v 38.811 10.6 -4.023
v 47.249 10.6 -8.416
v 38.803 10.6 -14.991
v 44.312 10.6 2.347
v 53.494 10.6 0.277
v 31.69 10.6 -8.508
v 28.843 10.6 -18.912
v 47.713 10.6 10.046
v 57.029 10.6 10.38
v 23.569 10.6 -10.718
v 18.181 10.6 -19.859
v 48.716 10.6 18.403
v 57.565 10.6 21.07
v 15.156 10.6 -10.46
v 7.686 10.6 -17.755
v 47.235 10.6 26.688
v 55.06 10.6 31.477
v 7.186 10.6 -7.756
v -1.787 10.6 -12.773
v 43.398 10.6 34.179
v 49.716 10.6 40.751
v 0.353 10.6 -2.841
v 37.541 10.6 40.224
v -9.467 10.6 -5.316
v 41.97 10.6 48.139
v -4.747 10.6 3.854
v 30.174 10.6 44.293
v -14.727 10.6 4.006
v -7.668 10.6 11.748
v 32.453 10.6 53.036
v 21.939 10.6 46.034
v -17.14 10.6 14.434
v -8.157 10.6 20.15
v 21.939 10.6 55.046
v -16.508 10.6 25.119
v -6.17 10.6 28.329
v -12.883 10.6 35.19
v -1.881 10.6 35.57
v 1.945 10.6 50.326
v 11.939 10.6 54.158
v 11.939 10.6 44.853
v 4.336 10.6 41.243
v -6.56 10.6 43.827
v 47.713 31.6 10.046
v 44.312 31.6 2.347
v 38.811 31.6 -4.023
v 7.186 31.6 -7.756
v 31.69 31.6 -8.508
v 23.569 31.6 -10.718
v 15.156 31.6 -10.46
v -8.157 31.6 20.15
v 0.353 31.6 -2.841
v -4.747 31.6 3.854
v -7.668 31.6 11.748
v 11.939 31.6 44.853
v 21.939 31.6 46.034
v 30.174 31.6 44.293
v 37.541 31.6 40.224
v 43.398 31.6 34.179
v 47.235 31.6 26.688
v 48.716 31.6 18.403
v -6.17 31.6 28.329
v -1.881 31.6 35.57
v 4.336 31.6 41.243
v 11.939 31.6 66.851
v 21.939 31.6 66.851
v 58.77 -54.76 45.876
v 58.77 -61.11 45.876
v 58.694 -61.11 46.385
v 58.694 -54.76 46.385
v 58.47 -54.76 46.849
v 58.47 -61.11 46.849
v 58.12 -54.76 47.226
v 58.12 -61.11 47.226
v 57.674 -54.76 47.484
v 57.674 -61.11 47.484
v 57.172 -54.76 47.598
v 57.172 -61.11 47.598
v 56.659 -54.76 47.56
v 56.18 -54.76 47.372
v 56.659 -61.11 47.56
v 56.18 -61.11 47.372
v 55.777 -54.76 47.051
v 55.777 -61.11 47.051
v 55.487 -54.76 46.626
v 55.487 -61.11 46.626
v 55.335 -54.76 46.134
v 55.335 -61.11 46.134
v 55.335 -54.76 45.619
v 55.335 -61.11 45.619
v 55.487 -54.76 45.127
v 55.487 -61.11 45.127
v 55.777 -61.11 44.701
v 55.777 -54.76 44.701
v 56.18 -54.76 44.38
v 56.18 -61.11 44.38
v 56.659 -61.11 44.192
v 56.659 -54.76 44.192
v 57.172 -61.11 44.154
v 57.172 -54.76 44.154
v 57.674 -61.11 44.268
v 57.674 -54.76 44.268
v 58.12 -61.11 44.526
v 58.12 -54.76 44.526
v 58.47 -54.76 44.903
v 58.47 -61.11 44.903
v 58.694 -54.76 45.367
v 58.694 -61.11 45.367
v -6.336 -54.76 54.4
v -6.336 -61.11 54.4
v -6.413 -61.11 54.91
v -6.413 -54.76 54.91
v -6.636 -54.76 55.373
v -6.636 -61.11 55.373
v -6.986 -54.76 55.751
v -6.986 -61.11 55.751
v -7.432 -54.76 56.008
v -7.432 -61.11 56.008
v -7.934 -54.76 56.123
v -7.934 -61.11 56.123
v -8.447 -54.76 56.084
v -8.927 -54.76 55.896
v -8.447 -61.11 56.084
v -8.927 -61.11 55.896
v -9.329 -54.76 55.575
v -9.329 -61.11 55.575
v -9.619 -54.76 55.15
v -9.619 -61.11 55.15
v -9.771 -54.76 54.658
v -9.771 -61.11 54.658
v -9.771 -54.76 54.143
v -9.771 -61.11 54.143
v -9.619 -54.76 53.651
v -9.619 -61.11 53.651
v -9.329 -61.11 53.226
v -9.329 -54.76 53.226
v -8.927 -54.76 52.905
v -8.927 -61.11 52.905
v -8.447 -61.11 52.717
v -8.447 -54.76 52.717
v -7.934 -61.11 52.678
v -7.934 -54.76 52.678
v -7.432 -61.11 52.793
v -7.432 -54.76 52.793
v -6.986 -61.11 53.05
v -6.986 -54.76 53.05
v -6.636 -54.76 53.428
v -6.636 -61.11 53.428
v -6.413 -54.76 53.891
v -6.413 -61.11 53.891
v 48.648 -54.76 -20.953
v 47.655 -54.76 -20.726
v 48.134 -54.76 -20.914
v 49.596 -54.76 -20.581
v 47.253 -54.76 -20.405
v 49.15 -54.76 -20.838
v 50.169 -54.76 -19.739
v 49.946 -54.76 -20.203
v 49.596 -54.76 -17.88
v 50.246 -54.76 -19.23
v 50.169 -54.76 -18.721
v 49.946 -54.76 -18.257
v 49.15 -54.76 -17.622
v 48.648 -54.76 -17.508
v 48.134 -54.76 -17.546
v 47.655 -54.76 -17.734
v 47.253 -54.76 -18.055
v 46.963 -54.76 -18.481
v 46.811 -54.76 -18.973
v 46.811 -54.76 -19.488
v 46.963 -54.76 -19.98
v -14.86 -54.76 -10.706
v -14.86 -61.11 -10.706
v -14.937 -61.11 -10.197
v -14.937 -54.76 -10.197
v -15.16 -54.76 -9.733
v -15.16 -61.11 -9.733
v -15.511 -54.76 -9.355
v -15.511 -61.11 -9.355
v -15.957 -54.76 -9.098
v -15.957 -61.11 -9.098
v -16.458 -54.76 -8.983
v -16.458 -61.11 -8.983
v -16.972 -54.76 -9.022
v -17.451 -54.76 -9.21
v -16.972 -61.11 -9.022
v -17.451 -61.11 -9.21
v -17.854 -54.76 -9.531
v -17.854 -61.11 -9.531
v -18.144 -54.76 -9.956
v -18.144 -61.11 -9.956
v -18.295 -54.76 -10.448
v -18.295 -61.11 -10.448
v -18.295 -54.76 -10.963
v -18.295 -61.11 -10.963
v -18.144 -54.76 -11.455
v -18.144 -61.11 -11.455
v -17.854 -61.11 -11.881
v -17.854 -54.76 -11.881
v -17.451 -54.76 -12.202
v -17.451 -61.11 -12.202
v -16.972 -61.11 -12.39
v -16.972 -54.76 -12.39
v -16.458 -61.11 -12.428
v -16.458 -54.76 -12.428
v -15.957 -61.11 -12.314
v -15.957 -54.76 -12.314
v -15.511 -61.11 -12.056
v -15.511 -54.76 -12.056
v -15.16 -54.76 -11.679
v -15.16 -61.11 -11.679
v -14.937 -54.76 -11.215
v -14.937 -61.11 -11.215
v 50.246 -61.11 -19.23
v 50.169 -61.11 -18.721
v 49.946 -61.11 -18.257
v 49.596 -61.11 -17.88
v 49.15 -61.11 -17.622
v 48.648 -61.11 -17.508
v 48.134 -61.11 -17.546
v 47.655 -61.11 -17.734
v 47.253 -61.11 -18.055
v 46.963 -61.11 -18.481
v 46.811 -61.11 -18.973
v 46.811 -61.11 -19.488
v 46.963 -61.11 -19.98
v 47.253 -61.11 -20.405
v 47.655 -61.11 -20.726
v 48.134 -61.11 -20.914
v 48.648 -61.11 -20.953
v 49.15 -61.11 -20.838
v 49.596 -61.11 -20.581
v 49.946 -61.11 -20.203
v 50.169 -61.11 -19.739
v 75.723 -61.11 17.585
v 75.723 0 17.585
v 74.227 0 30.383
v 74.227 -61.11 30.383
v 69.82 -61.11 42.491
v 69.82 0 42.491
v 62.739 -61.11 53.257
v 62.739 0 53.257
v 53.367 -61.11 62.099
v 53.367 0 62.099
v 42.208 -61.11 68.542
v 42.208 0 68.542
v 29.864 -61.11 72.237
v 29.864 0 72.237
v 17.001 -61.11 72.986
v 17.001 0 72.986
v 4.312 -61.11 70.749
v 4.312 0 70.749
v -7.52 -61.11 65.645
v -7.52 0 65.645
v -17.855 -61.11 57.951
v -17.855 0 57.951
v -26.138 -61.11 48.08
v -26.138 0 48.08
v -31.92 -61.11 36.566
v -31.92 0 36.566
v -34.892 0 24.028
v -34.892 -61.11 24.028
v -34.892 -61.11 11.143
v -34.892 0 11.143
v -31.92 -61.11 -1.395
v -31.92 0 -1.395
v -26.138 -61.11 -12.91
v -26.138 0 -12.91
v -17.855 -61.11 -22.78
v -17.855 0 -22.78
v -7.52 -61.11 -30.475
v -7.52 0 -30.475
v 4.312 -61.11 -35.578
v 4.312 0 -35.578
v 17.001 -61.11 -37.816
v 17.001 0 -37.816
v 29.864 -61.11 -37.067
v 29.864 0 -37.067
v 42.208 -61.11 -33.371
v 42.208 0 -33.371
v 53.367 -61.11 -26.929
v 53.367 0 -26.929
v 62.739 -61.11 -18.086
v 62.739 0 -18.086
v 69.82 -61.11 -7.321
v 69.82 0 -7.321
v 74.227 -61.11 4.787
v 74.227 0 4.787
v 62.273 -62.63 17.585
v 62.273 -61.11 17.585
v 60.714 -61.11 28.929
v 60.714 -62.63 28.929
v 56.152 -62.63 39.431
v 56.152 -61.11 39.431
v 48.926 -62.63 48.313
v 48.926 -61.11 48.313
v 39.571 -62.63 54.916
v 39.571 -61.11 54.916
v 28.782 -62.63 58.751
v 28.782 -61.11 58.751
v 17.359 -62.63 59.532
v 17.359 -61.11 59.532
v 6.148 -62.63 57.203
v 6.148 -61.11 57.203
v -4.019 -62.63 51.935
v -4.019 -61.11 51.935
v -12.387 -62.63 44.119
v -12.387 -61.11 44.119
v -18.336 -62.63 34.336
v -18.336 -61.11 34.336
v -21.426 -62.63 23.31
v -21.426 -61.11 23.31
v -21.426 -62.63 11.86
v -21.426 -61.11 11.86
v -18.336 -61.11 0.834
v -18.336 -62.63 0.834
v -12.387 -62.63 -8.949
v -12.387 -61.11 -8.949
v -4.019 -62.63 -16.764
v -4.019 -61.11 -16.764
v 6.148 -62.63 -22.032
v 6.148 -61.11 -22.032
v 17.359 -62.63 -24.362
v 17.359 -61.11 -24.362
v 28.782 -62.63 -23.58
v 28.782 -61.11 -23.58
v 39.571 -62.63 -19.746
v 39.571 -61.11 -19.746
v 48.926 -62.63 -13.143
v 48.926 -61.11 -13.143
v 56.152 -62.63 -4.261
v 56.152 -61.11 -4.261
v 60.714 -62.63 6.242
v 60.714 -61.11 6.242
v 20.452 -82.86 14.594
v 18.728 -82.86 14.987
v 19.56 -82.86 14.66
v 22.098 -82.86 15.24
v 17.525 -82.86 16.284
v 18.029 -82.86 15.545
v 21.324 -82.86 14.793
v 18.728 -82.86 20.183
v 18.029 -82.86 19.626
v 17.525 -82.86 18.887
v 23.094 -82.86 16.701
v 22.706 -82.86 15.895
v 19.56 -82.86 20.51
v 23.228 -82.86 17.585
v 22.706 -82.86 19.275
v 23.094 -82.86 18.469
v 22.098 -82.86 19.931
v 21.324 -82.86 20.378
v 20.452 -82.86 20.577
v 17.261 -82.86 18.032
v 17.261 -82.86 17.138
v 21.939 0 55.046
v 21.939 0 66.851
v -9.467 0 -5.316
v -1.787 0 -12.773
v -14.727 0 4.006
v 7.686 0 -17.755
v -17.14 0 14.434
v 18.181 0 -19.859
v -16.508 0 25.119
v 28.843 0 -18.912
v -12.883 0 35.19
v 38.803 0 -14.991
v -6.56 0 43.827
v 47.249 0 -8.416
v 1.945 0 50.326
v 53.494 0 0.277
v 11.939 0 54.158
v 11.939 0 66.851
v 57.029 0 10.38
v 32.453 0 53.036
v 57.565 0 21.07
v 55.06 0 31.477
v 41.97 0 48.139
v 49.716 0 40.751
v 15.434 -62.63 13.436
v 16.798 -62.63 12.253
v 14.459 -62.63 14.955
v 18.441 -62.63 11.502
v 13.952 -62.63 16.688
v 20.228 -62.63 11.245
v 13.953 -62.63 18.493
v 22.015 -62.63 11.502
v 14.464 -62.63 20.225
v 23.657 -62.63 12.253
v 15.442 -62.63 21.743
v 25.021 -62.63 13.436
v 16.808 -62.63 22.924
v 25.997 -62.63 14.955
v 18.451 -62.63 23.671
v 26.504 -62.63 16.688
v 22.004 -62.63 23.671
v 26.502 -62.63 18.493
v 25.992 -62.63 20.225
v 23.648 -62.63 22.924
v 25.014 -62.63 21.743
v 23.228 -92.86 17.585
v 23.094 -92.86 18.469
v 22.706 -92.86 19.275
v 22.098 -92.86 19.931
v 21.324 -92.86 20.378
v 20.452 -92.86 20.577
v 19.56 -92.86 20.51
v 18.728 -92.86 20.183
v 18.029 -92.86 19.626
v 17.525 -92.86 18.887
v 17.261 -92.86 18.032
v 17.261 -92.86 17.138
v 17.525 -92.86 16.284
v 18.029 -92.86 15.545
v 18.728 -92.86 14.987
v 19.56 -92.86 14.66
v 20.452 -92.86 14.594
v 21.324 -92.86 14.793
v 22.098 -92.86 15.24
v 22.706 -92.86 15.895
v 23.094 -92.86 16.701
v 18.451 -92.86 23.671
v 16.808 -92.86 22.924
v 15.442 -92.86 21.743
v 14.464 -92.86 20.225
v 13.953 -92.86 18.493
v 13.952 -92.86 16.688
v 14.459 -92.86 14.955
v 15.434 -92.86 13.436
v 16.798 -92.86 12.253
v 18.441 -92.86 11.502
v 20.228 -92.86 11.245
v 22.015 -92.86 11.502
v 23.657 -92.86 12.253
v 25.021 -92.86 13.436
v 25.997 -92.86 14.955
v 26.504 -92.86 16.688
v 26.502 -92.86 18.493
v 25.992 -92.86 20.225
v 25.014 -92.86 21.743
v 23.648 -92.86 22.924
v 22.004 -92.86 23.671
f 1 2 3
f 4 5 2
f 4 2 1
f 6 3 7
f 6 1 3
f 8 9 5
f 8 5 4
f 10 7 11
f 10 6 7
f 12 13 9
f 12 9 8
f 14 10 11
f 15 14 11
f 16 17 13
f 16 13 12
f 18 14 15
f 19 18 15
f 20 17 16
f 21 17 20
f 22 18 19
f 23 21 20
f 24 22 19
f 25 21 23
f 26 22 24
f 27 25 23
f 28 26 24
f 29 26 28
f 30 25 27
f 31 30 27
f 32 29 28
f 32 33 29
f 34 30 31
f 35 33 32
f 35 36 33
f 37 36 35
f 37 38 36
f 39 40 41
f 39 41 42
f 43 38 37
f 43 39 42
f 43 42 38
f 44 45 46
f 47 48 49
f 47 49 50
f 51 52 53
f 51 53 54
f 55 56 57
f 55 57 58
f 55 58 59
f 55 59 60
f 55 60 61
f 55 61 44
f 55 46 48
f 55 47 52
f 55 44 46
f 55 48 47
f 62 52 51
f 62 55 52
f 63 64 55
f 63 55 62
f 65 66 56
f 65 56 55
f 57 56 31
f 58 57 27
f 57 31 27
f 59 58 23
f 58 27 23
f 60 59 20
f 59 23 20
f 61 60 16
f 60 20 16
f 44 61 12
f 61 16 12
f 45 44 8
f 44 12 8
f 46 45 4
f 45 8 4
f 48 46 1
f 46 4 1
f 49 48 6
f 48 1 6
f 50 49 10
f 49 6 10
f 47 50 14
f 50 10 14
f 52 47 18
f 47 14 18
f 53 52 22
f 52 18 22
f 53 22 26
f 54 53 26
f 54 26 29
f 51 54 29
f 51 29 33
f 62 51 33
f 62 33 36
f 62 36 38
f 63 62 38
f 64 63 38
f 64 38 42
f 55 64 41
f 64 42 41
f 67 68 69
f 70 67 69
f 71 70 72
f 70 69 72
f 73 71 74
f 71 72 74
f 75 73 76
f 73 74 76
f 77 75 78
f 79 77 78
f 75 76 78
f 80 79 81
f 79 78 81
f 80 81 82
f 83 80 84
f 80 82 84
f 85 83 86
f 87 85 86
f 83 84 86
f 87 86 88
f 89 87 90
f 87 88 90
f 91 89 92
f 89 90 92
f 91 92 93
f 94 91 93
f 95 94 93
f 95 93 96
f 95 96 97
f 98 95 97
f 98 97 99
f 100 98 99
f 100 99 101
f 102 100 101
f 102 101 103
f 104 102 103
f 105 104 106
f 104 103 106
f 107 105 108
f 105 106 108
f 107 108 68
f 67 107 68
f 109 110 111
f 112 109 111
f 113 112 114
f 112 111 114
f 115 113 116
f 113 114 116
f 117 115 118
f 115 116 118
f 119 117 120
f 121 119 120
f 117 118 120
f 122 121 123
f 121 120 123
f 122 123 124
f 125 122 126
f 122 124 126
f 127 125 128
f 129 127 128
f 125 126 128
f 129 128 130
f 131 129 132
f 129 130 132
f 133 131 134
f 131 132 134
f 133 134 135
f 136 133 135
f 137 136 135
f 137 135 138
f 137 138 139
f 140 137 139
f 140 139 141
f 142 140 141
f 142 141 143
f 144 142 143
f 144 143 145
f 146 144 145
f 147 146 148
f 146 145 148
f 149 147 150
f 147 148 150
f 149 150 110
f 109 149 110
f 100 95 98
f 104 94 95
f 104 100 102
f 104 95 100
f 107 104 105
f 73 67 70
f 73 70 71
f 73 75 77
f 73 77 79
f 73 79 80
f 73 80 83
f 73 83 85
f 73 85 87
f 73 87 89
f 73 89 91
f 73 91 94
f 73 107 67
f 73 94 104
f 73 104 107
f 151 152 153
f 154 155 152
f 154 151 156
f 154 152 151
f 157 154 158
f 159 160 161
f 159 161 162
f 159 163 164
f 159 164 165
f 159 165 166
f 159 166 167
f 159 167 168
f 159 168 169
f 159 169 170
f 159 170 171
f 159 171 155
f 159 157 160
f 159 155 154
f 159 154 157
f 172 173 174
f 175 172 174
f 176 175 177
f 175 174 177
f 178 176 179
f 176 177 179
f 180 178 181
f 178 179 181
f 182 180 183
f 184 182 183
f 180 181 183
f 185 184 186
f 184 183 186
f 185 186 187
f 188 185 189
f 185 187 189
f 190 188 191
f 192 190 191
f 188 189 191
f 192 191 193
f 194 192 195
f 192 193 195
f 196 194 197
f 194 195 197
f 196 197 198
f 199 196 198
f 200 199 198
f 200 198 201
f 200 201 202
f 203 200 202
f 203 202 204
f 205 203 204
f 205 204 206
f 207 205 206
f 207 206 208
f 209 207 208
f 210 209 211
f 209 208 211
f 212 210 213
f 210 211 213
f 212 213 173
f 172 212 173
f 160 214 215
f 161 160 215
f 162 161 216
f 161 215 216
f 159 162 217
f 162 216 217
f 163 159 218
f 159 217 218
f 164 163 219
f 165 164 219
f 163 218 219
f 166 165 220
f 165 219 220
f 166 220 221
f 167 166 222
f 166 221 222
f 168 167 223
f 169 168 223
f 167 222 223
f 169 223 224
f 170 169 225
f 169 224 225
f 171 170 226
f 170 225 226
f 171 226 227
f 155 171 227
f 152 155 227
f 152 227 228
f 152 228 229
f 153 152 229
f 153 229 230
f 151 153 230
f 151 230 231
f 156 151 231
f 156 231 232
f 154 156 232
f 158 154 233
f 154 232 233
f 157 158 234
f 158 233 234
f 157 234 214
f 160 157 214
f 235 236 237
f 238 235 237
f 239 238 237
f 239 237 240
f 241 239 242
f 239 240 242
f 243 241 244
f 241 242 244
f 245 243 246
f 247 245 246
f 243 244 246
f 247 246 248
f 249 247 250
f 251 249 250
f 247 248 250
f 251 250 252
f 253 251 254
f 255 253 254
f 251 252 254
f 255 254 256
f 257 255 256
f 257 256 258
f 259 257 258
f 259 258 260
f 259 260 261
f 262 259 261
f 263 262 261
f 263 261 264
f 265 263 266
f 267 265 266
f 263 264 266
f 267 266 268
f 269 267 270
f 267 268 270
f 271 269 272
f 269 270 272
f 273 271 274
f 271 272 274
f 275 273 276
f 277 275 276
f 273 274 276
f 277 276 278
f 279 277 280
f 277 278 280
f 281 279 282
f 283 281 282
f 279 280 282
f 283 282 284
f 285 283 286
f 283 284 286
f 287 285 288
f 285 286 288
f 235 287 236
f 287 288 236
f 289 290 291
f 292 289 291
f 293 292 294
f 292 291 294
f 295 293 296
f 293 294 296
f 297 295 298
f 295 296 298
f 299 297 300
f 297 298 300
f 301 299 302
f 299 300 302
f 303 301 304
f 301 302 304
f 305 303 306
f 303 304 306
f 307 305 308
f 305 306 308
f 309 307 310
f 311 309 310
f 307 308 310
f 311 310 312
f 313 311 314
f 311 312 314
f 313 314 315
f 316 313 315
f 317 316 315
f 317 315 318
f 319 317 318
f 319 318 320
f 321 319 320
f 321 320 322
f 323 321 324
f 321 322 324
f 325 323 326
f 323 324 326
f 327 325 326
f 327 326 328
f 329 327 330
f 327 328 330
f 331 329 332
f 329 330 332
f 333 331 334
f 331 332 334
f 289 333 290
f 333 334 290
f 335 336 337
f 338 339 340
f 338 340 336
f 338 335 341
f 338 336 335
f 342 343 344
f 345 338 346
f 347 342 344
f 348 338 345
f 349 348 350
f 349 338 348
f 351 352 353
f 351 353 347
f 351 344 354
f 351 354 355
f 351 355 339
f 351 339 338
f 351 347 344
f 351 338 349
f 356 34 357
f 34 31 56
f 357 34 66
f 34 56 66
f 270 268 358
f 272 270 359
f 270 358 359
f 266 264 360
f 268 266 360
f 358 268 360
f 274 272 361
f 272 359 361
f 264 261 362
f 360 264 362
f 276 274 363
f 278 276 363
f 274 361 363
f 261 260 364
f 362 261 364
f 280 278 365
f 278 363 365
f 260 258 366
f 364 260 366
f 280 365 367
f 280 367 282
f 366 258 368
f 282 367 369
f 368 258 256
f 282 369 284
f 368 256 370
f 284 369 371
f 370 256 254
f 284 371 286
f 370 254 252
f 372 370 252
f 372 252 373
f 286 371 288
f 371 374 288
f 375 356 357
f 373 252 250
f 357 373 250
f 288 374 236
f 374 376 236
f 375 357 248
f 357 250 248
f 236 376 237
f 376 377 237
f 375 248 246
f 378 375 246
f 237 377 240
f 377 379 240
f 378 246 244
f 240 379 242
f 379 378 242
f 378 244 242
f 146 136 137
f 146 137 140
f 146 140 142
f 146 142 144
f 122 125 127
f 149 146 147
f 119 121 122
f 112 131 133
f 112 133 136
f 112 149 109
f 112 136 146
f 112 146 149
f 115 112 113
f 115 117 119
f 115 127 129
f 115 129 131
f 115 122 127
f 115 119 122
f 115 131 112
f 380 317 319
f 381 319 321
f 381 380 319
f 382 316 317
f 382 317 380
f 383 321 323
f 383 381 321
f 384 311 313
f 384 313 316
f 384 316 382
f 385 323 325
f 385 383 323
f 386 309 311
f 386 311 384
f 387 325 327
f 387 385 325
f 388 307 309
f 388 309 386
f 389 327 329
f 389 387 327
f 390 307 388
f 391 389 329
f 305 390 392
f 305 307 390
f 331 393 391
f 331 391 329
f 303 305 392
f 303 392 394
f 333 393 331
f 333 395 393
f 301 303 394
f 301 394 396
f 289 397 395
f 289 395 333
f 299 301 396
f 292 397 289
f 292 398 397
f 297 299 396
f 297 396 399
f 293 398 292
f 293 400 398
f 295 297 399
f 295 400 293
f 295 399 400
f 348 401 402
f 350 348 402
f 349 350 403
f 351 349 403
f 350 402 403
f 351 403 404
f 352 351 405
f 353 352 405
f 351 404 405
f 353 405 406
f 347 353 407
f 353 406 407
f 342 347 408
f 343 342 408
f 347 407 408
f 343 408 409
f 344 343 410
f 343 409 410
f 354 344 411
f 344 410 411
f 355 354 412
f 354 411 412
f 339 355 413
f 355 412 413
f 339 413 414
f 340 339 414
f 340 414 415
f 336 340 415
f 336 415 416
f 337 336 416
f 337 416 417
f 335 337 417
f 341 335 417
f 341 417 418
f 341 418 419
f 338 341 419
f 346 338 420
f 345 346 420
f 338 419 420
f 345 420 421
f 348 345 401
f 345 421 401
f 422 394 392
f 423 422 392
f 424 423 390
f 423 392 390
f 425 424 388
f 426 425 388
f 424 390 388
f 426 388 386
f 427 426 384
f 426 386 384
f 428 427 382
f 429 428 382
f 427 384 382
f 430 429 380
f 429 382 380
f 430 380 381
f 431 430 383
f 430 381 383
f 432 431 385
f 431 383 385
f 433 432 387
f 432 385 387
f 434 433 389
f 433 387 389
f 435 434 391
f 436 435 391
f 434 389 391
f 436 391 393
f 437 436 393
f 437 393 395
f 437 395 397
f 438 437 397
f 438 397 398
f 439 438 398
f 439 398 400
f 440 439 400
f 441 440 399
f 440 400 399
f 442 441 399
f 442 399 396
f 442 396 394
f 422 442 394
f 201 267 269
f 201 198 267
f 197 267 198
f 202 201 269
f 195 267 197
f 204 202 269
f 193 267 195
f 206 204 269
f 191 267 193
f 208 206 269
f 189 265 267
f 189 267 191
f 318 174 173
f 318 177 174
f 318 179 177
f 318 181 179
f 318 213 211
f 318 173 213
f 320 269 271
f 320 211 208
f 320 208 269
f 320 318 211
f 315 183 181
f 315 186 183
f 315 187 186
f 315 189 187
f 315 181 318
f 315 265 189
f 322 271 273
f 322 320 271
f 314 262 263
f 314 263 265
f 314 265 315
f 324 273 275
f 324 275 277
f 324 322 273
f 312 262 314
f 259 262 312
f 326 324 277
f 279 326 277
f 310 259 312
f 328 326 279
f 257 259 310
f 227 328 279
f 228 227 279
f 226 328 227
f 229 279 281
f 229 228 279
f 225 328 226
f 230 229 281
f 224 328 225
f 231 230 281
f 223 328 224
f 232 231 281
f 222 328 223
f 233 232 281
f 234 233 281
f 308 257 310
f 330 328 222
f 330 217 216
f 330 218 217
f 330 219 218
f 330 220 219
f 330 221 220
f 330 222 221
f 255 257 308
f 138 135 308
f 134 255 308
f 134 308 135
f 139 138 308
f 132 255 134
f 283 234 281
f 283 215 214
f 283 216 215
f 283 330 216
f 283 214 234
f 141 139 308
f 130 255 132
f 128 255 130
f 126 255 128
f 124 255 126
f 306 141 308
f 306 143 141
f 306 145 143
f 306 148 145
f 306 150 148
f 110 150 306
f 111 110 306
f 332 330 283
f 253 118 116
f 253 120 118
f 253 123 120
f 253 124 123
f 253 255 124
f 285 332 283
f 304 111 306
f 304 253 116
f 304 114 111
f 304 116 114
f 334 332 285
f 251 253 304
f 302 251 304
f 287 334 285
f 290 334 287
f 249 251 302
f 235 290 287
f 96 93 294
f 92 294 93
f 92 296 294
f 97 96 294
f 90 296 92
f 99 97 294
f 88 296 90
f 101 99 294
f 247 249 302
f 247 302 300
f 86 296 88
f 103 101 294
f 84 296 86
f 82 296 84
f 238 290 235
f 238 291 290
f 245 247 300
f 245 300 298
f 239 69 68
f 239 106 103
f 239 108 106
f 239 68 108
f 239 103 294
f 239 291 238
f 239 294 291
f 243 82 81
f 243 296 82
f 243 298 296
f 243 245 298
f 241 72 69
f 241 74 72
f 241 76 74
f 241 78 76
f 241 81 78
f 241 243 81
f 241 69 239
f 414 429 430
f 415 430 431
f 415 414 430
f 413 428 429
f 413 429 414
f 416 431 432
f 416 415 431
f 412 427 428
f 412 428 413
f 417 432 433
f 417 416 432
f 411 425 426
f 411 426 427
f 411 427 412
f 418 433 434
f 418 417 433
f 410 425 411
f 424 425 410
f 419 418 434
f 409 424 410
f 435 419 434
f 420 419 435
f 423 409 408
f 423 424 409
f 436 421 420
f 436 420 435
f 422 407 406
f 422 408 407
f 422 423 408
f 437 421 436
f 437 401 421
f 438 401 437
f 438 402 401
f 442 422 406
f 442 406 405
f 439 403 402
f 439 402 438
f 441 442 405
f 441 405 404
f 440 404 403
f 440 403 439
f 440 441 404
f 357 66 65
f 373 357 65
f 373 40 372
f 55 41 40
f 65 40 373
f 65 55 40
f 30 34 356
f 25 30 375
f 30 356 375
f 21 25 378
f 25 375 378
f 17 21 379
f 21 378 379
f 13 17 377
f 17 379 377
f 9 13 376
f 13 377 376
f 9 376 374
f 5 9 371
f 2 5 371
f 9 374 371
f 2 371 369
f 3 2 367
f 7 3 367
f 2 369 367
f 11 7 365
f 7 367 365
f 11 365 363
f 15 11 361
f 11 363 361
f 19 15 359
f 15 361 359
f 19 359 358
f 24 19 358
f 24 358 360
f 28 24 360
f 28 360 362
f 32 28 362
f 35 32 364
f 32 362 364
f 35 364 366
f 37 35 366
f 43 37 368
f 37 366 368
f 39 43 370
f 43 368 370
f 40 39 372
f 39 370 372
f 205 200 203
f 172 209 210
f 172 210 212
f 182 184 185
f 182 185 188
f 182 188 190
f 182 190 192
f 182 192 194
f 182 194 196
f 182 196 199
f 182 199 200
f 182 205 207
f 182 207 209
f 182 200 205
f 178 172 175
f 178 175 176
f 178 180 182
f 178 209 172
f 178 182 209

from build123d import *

# Parameters (mm, degrees)
F0_R          = 55.495
F1_DEPTH      = 61.11
F2_R          = 42.045
F3_DEPTH      = 1.52
F5_DEPTH      = 30.23
F5_DEPTH_BACK = 92.79
F6_R          = 37.5
F7_DEPTH      = 10.6
F8_R          = 28.5
F9_DEPTH      = 21
F10_R         = 1.7272
F11_DEPTH     = 6.35
F12_W         = 10
F12_H         = 50
F13_DEPTH     = 40
F14_R         = 3
F15_DEPTH     = 10


with BuildPart() as f1:
    # F0 (on Front) → F1 (new body)
    with BuildSketch(Plane.XZ):
        with Locations((20.227775, 17.58517)):
            Circle(F0_R)
    extrude(amount=F1_DEPTH)

    # F2 (on face) → F3 (join)
    with BuildSketch(Plane.XZ.offset(61.11)):
        with Locations((20.227775, 17.58517)):
            Circle(F2_R)
    extrude(amount=F3_DEPTH)

    # F4 (on face) → F5 (join, two sides)
    with BuildSketch(Plane.XZ.offset(62.63)) as f5_sk:
        with BuildLine():
            Line((22.004346, 23.67117), (18.451204, 23.67117))
            ThreePointArc((18.451204, 23.67117), (20.227775, 11.24517), (22.004346, 23.67117))
        make_face()
    extrude(amount=F5_DEPTH)
    extrude(f5_sk.sketch, amount=-F5_DEPTH_BACK)

    # F6 (on face) → F7 (join)
    with BuildSketch(Plane(origin=(0, 0, 0), x_dir=(-1, 0, 0), z_dir=(0, 1, 0))):
        with Locations((-20.227775, 17.58517)):
            Circle(F6_R)
    extrude(amount=F7_DEPTH)

    # F8 (on face) → F9 (join)
    with BuildSketch(Plane(origin=(0, 10.6, 0), x_dir=(-1, 0, 0), z_dir=(0, 1, 0))):
        with Locations((-20.227775, 17.58517)):
            Circle(F8_R)
    extrude(amount=F9_DEPTH)

    # F10 (on face) → F11 (cut)
    with BuildSketch(Plane.XZ.offset(61.11)):
        with Locations((57.043102, 45.876097)):
            Circle(F10_R)
        with Locations((-8.063152, 54.400497)):
            Circle(F10_R)
        with Locations((-16.587552, -10.705758)):
            Circle(F10_R)
        with Locations((48.518702, -19.230158)):
            Circle(F10_R)
    extrude(amount=-F11_DEPTH, mode=Mode.SUBTRACT)

    # F12 (on face) → F13 (join)
    with BuildSketch(Plane(origin=(0, 31.6, 0), x_dir=(-1, 0, 0), z_dir=(0, 1, 0))):
        with Locations((-16.93944, 41.850986)):
            Rectangle(F12_W, F12_H)
    extrude(amount=-F13_DEPTH)

    # F14 (on face) → F15 (cut)
    with BuildSketch(Plane.XZ.offset(92.86)):
        with Locations((20.227775, 17.58517)):
            Circle(F14_R)
    extrude(amount=-F15_DEPTH, mode=Mode.SUBTRACT)


solid = f1.part
